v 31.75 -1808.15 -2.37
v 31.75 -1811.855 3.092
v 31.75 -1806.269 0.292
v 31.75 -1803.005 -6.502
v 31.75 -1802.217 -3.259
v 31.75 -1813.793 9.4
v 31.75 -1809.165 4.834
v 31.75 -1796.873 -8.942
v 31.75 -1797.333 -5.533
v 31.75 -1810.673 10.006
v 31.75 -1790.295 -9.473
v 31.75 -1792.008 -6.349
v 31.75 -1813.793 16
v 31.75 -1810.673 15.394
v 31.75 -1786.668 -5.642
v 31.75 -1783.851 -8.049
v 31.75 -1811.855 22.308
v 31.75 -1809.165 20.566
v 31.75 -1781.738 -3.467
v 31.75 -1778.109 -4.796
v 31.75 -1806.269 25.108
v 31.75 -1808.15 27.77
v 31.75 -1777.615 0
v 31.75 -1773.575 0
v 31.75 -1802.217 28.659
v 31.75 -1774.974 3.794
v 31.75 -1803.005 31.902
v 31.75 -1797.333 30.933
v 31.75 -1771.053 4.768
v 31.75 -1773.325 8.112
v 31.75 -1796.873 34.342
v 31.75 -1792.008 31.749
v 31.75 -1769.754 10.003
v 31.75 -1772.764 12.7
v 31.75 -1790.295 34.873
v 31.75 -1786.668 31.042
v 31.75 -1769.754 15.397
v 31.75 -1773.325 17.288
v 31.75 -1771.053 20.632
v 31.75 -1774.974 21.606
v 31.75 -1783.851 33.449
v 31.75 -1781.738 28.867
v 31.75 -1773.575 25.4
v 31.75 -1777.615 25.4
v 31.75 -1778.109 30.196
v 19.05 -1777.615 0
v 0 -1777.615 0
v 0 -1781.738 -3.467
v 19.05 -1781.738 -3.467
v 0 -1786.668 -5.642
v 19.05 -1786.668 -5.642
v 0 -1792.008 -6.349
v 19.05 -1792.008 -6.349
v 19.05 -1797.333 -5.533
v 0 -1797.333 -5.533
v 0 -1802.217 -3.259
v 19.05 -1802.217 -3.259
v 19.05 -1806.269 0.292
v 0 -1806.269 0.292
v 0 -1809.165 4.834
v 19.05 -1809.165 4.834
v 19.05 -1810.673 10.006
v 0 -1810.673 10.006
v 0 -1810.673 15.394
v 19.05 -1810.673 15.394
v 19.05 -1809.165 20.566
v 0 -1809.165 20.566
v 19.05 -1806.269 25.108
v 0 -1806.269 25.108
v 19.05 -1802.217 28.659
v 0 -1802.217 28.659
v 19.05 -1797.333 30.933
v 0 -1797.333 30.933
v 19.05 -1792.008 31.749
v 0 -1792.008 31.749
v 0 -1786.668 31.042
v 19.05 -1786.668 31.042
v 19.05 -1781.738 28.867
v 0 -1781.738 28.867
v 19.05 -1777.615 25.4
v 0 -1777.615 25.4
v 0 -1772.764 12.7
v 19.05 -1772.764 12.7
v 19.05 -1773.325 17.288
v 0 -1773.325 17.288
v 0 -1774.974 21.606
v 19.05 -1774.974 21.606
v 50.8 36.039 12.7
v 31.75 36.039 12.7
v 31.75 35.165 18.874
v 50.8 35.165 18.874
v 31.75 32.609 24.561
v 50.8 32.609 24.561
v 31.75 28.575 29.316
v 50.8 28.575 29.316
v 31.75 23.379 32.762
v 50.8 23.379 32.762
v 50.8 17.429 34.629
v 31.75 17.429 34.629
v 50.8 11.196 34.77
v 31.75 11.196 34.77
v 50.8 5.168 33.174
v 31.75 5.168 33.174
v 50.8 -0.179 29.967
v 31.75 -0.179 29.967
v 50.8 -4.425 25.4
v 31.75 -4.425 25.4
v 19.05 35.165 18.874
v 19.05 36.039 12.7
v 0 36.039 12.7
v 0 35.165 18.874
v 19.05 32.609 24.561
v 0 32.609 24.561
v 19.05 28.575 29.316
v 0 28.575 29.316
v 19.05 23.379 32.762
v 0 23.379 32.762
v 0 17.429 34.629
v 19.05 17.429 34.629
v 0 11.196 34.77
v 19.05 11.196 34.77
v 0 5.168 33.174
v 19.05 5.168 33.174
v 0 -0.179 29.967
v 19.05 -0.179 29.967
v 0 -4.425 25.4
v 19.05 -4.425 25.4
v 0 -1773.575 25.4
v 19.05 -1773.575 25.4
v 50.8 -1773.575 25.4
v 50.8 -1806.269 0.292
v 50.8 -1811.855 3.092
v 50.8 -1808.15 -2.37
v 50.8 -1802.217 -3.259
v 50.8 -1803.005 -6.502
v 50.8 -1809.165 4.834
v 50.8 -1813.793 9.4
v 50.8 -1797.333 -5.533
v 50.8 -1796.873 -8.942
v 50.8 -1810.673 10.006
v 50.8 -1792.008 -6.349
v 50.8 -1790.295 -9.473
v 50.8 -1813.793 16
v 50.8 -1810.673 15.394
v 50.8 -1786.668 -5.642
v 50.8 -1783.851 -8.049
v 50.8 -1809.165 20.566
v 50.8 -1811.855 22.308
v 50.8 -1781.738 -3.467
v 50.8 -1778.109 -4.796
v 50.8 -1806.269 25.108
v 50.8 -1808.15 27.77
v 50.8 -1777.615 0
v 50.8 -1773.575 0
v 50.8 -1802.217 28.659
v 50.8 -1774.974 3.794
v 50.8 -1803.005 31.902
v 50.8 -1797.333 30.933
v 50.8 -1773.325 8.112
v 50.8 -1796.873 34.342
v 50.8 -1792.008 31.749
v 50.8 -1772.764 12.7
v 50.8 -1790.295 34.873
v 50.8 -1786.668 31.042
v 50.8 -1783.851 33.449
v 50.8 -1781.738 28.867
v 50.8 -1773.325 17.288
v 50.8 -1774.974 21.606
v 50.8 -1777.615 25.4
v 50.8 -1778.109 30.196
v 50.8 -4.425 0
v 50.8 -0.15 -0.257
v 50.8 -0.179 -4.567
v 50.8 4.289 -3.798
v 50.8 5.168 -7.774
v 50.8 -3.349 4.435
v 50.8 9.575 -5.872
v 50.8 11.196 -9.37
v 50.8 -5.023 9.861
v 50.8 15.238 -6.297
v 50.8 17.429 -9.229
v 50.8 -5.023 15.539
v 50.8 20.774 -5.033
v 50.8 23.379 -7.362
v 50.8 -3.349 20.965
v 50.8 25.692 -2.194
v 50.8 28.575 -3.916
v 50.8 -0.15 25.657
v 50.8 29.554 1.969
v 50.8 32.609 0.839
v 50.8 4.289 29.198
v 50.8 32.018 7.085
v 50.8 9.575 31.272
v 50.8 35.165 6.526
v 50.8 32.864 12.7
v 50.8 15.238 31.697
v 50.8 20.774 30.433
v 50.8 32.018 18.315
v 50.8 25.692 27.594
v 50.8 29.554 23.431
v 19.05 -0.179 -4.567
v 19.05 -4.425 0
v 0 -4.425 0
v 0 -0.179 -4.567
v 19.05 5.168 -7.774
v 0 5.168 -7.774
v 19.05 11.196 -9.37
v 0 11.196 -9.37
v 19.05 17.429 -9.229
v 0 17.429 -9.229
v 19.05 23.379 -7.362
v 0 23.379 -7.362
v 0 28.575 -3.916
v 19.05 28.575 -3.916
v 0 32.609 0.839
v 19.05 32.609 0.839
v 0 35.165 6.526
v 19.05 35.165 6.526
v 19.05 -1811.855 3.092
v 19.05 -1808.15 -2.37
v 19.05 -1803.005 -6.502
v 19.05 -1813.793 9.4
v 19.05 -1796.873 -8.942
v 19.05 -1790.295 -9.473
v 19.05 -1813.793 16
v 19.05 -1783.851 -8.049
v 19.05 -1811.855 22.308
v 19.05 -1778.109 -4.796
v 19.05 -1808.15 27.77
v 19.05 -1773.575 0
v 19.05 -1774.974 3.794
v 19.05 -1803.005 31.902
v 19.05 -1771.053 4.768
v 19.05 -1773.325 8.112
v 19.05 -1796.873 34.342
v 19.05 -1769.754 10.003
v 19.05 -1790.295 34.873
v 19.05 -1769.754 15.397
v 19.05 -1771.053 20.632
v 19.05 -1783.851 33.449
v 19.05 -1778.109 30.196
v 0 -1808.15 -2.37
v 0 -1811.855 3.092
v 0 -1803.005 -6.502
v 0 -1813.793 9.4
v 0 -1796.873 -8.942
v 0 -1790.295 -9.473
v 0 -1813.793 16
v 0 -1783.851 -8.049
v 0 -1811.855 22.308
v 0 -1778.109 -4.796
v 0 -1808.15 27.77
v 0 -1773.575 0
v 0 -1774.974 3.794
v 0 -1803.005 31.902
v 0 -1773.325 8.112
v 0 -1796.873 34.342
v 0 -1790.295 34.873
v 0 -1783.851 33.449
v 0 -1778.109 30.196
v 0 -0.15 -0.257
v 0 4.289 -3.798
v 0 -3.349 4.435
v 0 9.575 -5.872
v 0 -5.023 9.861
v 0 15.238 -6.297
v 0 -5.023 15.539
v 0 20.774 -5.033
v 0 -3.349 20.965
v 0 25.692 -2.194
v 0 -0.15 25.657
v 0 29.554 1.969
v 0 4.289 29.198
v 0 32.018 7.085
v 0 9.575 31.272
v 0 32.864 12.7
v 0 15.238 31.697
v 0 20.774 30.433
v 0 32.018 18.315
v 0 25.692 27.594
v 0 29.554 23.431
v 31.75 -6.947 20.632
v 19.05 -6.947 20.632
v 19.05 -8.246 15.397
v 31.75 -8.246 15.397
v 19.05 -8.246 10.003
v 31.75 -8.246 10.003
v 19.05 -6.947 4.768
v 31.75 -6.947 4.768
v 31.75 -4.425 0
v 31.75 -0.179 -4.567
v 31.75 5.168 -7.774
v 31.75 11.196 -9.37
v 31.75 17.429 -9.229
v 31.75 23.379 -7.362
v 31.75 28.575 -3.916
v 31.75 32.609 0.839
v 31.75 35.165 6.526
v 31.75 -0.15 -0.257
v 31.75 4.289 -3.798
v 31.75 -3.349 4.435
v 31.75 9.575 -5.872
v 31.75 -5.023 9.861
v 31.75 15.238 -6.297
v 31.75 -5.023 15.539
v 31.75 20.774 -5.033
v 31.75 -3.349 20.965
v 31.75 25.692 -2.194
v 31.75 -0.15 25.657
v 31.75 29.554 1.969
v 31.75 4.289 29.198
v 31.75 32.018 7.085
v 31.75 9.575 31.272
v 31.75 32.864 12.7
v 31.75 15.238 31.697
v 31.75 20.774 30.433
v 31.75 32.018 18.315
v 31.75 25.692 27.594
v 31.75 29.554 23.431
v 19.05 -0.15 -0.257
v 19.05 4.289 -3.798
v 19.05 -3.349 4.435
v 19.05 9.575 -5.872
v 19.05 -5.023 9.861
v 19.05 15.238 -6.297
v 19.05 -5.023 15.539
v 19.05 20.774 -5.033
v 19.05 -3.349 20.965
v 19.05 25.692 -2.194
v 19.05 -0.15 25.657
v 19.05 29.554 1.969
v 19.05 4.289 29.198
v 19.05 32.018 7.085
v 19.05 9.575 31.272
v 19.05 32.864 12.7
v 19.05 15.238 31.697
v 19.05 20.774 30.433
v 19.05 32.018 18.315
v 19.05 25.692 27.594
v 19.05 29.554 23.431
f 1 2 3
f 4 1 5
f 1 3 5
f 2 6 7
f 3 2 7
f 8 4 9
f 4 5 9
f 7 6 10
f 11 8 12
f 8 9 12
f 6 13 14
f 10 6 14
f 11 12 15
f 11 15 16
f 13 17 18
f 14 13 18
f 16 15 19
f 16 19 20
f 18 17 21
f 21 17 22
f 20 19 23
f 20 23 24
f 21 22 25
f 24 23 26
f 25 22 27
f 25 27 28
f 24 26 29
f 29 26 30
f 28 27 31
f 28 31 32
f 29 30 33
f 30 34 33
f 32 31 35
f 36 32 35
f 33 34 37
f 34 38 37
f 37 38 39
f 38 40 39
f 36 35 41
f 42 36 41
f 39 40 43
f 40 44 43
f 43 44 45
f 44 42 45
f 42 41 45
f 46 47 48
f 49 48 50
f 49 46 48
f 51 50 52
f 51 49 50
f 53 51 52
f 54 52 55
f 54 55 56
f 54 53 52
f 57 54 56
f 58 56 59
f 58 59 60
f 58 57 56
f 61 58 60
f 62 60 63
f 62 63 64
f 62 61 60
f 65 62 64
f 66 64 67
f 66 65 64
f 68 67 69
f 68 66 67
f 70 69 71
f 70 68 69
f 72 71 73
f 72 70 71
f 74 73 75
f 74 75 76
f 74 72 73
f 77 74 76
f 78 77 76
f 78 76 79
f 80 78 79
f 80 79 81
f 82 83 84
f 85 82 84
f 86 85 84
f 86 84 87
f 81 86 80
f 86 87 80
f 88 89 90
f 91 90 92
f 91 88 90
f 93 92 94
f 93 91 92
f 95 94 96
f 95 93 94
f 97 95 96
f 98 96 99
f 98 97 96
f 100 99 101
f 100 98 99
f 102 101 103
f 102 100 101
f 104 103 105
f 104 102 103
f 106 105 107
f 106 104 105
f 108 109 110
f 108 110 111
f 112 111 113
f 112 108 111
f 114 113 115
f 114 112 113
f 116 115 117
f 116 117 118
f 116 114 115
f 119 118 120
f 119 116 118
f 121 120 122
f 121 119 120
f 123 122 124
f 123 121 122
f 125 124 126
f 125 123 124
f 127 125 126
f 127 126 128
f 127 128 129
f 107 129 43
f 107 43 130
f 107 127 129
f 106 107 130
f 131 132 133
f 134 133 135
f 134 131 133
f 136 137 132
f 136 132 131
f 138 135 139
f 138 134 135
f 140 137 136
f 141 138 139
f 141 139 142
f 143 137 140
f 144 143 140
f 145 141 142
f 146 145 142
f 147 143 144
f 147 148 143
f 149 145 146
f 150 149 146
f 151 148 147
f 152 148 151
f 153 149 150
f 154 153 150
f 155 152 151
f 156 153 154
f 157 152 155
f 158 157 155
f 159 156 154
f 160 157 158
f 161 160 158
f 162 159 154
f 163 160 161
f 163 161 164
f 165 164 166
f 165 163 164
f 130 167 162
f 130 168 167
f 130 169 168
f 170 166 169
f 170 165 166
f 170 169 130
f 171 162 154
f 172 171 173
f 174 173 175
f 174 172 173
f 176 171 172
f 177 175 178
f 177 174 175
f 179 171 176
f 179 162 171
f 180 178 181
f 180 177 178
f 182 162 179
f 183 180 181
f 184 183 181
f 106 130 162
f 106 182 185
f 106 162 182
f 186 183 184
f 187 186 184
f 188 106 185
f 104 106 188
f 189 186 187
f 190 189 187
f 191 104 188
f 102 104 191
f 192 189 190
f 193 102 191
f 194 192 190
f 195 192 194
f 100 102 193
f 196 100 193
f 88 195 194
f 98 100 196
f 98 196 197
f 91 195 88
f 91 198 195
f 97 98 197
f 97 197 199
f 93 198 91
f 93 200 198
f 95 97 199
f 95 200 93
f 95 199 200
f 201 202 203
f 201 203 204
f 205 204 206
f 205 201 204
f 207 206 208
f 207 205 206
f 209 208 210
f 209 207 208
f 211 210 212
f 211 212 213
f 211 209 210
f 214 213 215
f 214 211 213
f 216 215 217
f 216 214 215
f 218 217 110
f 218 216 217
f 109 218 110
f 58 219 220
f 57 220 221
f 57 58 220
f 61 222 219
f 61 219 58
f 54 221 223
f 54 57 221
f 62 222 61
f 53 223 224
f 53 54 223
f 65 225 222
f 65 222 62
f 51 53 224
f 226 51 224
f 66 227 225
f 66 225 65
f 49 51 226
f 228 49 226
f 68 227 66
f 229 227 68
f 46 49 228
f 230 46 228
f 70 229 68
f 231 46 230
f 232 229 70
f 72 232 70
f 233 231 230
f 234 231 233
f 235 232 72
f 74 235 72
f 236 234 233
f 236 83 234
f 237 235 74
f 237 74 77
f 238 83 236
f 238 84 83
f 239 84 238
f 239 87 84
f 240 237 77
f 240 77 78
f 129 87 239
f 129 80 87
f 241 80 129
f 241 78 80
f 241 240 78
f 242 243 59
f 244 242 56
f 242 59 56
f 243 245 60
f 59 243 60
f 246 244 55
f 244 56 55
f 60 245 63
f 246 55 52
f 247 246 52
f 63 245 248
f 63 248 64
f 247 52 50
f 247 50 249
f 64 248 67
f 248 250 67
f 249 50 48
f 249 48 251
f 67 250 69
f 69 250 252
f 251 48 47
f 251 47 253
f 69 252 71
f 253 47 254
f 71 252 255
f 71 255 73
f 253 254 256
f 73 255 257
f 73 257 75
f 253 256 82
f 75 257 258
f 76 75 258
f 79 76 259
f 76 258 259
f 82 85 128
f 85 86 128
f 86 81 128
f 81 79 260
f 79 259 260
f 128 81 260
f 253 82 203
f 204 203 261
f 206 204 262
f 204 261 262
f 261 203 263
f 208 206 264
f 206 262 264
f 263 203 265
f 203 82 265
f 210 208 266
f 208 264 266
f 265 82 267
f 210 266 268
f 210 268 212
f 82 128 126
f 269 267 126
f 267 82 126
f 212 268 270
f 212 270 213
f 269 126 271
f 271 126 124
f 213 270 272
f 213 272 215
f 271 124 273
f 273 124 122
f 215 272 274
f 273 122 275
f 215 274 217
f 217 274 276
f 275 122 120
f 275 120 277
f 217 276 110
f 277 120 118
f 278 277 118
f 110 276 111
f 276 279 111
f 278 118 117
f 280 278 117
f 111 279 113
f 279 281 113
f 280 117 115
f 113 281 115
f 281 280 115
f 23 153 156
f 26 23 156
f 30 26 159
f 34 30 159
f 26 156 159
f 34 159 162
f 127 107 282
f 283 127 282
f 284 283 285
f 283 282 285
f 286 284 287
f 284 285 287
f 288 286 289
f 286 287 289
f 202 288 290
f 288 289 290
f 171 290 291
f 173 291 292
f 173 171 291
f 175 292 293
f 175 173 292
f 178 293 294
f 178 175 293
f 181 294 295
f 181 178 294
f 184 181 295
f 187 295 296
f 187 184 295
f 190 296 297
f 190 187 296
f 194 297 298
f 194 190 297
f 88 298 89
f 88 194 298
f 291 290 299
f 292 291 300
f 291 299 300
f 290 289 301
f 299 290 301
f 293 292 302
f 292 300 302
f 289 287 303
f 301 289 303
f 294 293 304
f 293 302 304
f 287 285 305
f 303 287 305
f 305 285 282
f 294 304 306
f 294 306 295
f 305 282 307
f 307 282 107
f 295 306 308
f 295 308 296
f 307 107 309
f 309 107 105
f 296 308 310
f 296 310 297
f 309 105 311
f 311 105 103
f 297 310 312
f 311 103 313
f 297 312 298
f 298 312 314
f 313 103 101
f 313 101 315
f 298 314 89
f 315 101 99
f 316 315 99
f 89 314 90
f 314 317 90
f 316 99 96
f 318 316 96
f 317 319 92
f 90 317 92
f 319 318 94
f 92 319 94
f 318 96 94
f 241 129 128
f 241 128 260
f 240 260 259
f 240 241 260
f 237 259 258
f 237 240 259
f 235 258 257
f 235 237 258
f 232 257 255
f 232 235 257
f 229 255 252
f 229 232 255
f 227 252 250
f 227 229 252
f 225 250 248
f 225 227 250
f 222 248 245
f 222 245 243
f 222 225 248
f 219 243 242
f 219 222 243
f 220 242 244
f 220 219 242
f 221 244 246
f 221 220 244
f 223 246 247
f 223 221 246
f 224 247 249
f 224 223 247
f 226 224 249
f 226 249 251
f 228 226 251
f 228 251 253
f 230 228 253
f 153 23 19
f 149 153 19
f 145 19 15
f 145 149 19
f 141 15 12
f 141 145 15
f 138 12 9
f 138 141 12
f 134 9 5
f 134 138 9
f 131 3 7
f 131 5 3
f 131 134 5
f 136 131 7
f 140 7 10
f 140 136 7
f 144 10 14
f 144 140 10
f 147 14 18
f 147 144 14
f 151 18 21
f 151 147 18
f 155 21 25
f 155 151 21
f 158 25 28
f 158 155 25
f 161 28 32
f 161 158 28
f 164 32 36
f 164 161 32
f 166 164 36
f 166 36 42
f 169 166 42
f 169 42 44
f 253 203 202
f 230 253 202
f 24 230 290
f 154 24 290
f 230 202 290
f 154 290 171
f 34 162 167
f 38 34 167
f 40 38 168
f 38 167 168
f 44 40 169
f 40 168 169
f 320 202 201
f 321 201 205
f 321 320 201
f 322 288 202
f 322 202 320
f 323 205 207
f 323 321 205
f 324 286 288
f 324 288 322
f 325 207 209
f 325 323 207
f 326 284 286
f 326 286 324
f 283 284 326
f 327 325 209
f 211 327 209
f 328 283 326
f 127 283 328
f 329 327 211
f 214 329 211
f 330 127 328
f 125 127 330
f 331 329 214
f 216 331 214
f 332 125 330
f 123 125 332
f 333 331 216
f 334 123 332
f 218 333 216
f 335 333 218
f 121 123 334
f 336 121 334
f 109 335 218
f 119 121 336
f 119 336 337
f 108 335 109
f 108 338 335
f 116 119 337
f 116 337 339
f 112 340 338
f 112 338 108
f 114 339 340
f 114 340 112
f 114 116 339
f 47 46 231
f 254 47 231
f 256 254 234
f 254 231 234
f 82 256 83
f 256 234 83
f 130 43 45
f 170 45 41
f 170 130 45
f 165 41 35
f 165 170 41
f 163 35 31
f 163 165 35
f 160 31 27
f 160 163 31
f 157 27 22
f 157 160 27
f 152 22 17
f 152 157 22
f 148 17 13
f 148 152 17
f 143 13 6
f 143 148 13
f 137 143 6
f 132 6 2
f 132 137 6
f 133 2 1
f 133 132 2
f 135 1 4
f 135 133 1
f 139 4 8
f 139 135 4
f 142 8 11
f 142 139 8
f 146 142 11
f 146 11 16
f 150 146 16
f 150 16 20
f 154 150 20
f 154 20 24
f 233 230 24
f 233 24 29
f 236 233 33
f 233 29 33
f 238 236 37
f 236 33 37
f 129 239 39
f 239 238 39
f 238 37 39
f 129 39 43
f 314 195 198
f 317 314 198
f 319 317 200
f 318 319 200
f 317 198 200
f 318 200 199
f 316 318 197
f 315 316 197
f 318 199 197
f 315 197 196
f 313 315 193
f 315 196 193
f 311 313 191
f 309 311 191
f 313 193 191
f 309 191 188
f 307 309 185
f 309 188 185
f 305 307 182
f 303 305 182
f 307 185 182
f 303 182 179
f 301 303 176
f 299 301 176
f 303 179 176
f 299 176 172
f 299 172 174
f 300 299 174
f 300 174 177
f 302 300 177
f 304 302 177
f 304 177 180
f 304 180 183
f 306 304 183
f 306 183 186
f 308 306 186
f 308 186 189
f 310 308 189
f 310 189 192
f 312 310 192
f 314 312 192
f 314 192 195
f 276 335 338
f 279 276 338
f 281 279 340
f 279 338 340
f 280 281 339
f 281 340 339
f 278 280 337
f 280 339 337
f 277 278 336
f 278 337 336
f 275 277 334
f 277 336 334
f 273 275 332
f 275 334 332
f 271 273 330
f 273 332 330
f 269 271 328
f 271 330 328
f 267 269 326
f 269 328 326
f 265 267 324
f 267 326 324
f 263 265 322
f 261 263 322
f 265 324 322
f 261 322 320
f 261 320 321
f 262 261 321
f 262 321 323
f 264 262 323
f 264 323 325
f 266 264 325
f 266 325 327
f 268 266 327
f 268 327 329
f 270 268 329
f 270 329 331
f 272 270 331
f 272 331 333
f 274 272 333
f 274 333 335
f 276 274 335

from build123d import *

# Parameters (mm, degrees)
F0_W     = 50.8
F0_H     = 25.4
F1_DEPTH = 1778
F6_DEPTH = 50.8
F4_R     = 22.225
F7_DEPTH = 12.7
F8_R     = 19.05
F9_DEPTH = 50.8


with BuildPart() as f1:
    # F0 (on Front) → F1 (new body)
    with BuildSketch(Plane.XZ):
        with Locations((25.4, 12.7)):
            Rectangle(F0_W, F0_H)
    extrude(amount=F1_DEPTH)

    # F5 (on face) → F6 (join)
    with BuildSketch(Plane.YZ.offset(50.8)):
        with BuildLine():
            ThreePointArc((36.0393014908, 12.7), (20.46971854, 33.9050948807), (-4.424684912, 25.4))
            Line((-4.424684912, 25.4), (0, 25.4))
            Line((0, 25.4), (0, 0))
            Line((0, 0), (-4.424684912, 0))
            ThreePointArc((-4.424684912, 0), (20.46971854, -8.5050948807), (36.0393014908, 12.7))
        make_face()
        with BuildLine():
            Line((-1777.6152698337, 25.4), (-1773.575315088, 25.4))
            ThreePointArc((-1773.575315088, 25.4), (-1814.0393014908, 12.7), (-1773.575315088, 0))
            Line((-1773.575315088, 0), (-1777.6152698337, 0))
            ThreePointArc((-1777.6152698337, 0), (-1810.8643014908, 12.7), (-1777.6152698337, 25.4))
        make_face()
    extrude(amount=-F6_DEPTH)

    # F4 (on offset) → F7 (cut)
    with BuildSketch(Plane.YZ.offset(31.75)):
        with Locations((-1791.8143014908, 12.7)):
            Circle(F4_R)
        with Locations((13.8143014908, 12.7)):
            Circle(F4_R)
    extrude(amount=-F7_DEPTH, mode=Mode.SUBTRACT)

    # F8 (on face) → F9 (cut)
    with BuildSketch(Plane.YZ.offset(50.8)):
        with BuildLine():
            ThreePointArc((-1777.6152698337, 0), (-1774.0183180525, 5.9025391898), (-1772.7643014908, 12.7))
            ThreePointArc((-1772.7643014908, 12.7), (-1774.0183180525, 19.4974608102), (-1777.6152698337, 25.4))
            Line((-1777.6152698337, 25.4), (-1778, 25.4))
            Line((-1778, 25.4), (-1778, 0))
            Line((-1778, 0), (-1777.6152698337, 0))
        make_face()
        with Locations((13.8143014908, 12.7)):
            Circle(F8_R)
    extrude(amount=-F9_DEPTH, mode=Mode.SUBTRACT)


solid = f1.part
